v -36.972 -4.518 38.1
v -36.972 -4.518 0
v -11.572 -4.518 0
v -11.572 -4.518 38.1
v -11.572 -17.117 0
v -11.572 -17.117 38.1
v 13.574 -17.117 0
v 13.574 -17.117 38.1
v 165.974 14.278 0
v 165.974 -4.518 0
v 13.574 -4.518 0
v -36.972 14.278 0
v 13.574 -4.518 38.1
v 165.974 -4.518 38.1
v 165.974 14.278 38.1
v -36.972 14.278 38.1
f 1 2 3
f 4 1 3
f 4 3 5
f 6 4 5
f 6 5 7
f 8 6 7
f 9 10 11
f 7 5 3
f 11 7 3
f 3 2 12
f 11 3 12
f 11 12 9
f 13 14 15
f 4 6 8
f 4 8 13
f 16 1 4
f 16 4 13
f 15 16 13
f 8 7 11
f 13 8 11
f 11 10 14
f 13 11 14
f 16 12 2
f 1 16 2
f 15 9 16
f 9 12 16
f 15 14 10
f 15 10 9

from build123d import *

# Parameters (mm, degrees)
F1_DEPTH = 38.1
F2_W     = 18.796
F2_H     = 38.1
F3_DEPTH = 127


with BuildPart() as f1:
    # F0 (on Top) → F1 (new body)
    with BuildSketch(Plane.XY):
        Polygon((38.974344, 14.27756), (-36.971656, 14.27756), (-36.971656, -4.51844), (-11.571656, -4.51844), (-11.571656, -17.11684), (13.574344, -17.11684), (13.574344, -4.51844), (38.974344, -4.51844), align=None)
    extrude(amount=F1_DEPTH)

    # F2 (on face) → F3 (join)
    with BuildSketch(Plane.YZ.offset(38.974344)):
        with Locations((4.87956, 19.05)):
            Rectangle(F2_W, F2_H)
    extrude(amount=F3_DEPTH)


solid = f1.part
